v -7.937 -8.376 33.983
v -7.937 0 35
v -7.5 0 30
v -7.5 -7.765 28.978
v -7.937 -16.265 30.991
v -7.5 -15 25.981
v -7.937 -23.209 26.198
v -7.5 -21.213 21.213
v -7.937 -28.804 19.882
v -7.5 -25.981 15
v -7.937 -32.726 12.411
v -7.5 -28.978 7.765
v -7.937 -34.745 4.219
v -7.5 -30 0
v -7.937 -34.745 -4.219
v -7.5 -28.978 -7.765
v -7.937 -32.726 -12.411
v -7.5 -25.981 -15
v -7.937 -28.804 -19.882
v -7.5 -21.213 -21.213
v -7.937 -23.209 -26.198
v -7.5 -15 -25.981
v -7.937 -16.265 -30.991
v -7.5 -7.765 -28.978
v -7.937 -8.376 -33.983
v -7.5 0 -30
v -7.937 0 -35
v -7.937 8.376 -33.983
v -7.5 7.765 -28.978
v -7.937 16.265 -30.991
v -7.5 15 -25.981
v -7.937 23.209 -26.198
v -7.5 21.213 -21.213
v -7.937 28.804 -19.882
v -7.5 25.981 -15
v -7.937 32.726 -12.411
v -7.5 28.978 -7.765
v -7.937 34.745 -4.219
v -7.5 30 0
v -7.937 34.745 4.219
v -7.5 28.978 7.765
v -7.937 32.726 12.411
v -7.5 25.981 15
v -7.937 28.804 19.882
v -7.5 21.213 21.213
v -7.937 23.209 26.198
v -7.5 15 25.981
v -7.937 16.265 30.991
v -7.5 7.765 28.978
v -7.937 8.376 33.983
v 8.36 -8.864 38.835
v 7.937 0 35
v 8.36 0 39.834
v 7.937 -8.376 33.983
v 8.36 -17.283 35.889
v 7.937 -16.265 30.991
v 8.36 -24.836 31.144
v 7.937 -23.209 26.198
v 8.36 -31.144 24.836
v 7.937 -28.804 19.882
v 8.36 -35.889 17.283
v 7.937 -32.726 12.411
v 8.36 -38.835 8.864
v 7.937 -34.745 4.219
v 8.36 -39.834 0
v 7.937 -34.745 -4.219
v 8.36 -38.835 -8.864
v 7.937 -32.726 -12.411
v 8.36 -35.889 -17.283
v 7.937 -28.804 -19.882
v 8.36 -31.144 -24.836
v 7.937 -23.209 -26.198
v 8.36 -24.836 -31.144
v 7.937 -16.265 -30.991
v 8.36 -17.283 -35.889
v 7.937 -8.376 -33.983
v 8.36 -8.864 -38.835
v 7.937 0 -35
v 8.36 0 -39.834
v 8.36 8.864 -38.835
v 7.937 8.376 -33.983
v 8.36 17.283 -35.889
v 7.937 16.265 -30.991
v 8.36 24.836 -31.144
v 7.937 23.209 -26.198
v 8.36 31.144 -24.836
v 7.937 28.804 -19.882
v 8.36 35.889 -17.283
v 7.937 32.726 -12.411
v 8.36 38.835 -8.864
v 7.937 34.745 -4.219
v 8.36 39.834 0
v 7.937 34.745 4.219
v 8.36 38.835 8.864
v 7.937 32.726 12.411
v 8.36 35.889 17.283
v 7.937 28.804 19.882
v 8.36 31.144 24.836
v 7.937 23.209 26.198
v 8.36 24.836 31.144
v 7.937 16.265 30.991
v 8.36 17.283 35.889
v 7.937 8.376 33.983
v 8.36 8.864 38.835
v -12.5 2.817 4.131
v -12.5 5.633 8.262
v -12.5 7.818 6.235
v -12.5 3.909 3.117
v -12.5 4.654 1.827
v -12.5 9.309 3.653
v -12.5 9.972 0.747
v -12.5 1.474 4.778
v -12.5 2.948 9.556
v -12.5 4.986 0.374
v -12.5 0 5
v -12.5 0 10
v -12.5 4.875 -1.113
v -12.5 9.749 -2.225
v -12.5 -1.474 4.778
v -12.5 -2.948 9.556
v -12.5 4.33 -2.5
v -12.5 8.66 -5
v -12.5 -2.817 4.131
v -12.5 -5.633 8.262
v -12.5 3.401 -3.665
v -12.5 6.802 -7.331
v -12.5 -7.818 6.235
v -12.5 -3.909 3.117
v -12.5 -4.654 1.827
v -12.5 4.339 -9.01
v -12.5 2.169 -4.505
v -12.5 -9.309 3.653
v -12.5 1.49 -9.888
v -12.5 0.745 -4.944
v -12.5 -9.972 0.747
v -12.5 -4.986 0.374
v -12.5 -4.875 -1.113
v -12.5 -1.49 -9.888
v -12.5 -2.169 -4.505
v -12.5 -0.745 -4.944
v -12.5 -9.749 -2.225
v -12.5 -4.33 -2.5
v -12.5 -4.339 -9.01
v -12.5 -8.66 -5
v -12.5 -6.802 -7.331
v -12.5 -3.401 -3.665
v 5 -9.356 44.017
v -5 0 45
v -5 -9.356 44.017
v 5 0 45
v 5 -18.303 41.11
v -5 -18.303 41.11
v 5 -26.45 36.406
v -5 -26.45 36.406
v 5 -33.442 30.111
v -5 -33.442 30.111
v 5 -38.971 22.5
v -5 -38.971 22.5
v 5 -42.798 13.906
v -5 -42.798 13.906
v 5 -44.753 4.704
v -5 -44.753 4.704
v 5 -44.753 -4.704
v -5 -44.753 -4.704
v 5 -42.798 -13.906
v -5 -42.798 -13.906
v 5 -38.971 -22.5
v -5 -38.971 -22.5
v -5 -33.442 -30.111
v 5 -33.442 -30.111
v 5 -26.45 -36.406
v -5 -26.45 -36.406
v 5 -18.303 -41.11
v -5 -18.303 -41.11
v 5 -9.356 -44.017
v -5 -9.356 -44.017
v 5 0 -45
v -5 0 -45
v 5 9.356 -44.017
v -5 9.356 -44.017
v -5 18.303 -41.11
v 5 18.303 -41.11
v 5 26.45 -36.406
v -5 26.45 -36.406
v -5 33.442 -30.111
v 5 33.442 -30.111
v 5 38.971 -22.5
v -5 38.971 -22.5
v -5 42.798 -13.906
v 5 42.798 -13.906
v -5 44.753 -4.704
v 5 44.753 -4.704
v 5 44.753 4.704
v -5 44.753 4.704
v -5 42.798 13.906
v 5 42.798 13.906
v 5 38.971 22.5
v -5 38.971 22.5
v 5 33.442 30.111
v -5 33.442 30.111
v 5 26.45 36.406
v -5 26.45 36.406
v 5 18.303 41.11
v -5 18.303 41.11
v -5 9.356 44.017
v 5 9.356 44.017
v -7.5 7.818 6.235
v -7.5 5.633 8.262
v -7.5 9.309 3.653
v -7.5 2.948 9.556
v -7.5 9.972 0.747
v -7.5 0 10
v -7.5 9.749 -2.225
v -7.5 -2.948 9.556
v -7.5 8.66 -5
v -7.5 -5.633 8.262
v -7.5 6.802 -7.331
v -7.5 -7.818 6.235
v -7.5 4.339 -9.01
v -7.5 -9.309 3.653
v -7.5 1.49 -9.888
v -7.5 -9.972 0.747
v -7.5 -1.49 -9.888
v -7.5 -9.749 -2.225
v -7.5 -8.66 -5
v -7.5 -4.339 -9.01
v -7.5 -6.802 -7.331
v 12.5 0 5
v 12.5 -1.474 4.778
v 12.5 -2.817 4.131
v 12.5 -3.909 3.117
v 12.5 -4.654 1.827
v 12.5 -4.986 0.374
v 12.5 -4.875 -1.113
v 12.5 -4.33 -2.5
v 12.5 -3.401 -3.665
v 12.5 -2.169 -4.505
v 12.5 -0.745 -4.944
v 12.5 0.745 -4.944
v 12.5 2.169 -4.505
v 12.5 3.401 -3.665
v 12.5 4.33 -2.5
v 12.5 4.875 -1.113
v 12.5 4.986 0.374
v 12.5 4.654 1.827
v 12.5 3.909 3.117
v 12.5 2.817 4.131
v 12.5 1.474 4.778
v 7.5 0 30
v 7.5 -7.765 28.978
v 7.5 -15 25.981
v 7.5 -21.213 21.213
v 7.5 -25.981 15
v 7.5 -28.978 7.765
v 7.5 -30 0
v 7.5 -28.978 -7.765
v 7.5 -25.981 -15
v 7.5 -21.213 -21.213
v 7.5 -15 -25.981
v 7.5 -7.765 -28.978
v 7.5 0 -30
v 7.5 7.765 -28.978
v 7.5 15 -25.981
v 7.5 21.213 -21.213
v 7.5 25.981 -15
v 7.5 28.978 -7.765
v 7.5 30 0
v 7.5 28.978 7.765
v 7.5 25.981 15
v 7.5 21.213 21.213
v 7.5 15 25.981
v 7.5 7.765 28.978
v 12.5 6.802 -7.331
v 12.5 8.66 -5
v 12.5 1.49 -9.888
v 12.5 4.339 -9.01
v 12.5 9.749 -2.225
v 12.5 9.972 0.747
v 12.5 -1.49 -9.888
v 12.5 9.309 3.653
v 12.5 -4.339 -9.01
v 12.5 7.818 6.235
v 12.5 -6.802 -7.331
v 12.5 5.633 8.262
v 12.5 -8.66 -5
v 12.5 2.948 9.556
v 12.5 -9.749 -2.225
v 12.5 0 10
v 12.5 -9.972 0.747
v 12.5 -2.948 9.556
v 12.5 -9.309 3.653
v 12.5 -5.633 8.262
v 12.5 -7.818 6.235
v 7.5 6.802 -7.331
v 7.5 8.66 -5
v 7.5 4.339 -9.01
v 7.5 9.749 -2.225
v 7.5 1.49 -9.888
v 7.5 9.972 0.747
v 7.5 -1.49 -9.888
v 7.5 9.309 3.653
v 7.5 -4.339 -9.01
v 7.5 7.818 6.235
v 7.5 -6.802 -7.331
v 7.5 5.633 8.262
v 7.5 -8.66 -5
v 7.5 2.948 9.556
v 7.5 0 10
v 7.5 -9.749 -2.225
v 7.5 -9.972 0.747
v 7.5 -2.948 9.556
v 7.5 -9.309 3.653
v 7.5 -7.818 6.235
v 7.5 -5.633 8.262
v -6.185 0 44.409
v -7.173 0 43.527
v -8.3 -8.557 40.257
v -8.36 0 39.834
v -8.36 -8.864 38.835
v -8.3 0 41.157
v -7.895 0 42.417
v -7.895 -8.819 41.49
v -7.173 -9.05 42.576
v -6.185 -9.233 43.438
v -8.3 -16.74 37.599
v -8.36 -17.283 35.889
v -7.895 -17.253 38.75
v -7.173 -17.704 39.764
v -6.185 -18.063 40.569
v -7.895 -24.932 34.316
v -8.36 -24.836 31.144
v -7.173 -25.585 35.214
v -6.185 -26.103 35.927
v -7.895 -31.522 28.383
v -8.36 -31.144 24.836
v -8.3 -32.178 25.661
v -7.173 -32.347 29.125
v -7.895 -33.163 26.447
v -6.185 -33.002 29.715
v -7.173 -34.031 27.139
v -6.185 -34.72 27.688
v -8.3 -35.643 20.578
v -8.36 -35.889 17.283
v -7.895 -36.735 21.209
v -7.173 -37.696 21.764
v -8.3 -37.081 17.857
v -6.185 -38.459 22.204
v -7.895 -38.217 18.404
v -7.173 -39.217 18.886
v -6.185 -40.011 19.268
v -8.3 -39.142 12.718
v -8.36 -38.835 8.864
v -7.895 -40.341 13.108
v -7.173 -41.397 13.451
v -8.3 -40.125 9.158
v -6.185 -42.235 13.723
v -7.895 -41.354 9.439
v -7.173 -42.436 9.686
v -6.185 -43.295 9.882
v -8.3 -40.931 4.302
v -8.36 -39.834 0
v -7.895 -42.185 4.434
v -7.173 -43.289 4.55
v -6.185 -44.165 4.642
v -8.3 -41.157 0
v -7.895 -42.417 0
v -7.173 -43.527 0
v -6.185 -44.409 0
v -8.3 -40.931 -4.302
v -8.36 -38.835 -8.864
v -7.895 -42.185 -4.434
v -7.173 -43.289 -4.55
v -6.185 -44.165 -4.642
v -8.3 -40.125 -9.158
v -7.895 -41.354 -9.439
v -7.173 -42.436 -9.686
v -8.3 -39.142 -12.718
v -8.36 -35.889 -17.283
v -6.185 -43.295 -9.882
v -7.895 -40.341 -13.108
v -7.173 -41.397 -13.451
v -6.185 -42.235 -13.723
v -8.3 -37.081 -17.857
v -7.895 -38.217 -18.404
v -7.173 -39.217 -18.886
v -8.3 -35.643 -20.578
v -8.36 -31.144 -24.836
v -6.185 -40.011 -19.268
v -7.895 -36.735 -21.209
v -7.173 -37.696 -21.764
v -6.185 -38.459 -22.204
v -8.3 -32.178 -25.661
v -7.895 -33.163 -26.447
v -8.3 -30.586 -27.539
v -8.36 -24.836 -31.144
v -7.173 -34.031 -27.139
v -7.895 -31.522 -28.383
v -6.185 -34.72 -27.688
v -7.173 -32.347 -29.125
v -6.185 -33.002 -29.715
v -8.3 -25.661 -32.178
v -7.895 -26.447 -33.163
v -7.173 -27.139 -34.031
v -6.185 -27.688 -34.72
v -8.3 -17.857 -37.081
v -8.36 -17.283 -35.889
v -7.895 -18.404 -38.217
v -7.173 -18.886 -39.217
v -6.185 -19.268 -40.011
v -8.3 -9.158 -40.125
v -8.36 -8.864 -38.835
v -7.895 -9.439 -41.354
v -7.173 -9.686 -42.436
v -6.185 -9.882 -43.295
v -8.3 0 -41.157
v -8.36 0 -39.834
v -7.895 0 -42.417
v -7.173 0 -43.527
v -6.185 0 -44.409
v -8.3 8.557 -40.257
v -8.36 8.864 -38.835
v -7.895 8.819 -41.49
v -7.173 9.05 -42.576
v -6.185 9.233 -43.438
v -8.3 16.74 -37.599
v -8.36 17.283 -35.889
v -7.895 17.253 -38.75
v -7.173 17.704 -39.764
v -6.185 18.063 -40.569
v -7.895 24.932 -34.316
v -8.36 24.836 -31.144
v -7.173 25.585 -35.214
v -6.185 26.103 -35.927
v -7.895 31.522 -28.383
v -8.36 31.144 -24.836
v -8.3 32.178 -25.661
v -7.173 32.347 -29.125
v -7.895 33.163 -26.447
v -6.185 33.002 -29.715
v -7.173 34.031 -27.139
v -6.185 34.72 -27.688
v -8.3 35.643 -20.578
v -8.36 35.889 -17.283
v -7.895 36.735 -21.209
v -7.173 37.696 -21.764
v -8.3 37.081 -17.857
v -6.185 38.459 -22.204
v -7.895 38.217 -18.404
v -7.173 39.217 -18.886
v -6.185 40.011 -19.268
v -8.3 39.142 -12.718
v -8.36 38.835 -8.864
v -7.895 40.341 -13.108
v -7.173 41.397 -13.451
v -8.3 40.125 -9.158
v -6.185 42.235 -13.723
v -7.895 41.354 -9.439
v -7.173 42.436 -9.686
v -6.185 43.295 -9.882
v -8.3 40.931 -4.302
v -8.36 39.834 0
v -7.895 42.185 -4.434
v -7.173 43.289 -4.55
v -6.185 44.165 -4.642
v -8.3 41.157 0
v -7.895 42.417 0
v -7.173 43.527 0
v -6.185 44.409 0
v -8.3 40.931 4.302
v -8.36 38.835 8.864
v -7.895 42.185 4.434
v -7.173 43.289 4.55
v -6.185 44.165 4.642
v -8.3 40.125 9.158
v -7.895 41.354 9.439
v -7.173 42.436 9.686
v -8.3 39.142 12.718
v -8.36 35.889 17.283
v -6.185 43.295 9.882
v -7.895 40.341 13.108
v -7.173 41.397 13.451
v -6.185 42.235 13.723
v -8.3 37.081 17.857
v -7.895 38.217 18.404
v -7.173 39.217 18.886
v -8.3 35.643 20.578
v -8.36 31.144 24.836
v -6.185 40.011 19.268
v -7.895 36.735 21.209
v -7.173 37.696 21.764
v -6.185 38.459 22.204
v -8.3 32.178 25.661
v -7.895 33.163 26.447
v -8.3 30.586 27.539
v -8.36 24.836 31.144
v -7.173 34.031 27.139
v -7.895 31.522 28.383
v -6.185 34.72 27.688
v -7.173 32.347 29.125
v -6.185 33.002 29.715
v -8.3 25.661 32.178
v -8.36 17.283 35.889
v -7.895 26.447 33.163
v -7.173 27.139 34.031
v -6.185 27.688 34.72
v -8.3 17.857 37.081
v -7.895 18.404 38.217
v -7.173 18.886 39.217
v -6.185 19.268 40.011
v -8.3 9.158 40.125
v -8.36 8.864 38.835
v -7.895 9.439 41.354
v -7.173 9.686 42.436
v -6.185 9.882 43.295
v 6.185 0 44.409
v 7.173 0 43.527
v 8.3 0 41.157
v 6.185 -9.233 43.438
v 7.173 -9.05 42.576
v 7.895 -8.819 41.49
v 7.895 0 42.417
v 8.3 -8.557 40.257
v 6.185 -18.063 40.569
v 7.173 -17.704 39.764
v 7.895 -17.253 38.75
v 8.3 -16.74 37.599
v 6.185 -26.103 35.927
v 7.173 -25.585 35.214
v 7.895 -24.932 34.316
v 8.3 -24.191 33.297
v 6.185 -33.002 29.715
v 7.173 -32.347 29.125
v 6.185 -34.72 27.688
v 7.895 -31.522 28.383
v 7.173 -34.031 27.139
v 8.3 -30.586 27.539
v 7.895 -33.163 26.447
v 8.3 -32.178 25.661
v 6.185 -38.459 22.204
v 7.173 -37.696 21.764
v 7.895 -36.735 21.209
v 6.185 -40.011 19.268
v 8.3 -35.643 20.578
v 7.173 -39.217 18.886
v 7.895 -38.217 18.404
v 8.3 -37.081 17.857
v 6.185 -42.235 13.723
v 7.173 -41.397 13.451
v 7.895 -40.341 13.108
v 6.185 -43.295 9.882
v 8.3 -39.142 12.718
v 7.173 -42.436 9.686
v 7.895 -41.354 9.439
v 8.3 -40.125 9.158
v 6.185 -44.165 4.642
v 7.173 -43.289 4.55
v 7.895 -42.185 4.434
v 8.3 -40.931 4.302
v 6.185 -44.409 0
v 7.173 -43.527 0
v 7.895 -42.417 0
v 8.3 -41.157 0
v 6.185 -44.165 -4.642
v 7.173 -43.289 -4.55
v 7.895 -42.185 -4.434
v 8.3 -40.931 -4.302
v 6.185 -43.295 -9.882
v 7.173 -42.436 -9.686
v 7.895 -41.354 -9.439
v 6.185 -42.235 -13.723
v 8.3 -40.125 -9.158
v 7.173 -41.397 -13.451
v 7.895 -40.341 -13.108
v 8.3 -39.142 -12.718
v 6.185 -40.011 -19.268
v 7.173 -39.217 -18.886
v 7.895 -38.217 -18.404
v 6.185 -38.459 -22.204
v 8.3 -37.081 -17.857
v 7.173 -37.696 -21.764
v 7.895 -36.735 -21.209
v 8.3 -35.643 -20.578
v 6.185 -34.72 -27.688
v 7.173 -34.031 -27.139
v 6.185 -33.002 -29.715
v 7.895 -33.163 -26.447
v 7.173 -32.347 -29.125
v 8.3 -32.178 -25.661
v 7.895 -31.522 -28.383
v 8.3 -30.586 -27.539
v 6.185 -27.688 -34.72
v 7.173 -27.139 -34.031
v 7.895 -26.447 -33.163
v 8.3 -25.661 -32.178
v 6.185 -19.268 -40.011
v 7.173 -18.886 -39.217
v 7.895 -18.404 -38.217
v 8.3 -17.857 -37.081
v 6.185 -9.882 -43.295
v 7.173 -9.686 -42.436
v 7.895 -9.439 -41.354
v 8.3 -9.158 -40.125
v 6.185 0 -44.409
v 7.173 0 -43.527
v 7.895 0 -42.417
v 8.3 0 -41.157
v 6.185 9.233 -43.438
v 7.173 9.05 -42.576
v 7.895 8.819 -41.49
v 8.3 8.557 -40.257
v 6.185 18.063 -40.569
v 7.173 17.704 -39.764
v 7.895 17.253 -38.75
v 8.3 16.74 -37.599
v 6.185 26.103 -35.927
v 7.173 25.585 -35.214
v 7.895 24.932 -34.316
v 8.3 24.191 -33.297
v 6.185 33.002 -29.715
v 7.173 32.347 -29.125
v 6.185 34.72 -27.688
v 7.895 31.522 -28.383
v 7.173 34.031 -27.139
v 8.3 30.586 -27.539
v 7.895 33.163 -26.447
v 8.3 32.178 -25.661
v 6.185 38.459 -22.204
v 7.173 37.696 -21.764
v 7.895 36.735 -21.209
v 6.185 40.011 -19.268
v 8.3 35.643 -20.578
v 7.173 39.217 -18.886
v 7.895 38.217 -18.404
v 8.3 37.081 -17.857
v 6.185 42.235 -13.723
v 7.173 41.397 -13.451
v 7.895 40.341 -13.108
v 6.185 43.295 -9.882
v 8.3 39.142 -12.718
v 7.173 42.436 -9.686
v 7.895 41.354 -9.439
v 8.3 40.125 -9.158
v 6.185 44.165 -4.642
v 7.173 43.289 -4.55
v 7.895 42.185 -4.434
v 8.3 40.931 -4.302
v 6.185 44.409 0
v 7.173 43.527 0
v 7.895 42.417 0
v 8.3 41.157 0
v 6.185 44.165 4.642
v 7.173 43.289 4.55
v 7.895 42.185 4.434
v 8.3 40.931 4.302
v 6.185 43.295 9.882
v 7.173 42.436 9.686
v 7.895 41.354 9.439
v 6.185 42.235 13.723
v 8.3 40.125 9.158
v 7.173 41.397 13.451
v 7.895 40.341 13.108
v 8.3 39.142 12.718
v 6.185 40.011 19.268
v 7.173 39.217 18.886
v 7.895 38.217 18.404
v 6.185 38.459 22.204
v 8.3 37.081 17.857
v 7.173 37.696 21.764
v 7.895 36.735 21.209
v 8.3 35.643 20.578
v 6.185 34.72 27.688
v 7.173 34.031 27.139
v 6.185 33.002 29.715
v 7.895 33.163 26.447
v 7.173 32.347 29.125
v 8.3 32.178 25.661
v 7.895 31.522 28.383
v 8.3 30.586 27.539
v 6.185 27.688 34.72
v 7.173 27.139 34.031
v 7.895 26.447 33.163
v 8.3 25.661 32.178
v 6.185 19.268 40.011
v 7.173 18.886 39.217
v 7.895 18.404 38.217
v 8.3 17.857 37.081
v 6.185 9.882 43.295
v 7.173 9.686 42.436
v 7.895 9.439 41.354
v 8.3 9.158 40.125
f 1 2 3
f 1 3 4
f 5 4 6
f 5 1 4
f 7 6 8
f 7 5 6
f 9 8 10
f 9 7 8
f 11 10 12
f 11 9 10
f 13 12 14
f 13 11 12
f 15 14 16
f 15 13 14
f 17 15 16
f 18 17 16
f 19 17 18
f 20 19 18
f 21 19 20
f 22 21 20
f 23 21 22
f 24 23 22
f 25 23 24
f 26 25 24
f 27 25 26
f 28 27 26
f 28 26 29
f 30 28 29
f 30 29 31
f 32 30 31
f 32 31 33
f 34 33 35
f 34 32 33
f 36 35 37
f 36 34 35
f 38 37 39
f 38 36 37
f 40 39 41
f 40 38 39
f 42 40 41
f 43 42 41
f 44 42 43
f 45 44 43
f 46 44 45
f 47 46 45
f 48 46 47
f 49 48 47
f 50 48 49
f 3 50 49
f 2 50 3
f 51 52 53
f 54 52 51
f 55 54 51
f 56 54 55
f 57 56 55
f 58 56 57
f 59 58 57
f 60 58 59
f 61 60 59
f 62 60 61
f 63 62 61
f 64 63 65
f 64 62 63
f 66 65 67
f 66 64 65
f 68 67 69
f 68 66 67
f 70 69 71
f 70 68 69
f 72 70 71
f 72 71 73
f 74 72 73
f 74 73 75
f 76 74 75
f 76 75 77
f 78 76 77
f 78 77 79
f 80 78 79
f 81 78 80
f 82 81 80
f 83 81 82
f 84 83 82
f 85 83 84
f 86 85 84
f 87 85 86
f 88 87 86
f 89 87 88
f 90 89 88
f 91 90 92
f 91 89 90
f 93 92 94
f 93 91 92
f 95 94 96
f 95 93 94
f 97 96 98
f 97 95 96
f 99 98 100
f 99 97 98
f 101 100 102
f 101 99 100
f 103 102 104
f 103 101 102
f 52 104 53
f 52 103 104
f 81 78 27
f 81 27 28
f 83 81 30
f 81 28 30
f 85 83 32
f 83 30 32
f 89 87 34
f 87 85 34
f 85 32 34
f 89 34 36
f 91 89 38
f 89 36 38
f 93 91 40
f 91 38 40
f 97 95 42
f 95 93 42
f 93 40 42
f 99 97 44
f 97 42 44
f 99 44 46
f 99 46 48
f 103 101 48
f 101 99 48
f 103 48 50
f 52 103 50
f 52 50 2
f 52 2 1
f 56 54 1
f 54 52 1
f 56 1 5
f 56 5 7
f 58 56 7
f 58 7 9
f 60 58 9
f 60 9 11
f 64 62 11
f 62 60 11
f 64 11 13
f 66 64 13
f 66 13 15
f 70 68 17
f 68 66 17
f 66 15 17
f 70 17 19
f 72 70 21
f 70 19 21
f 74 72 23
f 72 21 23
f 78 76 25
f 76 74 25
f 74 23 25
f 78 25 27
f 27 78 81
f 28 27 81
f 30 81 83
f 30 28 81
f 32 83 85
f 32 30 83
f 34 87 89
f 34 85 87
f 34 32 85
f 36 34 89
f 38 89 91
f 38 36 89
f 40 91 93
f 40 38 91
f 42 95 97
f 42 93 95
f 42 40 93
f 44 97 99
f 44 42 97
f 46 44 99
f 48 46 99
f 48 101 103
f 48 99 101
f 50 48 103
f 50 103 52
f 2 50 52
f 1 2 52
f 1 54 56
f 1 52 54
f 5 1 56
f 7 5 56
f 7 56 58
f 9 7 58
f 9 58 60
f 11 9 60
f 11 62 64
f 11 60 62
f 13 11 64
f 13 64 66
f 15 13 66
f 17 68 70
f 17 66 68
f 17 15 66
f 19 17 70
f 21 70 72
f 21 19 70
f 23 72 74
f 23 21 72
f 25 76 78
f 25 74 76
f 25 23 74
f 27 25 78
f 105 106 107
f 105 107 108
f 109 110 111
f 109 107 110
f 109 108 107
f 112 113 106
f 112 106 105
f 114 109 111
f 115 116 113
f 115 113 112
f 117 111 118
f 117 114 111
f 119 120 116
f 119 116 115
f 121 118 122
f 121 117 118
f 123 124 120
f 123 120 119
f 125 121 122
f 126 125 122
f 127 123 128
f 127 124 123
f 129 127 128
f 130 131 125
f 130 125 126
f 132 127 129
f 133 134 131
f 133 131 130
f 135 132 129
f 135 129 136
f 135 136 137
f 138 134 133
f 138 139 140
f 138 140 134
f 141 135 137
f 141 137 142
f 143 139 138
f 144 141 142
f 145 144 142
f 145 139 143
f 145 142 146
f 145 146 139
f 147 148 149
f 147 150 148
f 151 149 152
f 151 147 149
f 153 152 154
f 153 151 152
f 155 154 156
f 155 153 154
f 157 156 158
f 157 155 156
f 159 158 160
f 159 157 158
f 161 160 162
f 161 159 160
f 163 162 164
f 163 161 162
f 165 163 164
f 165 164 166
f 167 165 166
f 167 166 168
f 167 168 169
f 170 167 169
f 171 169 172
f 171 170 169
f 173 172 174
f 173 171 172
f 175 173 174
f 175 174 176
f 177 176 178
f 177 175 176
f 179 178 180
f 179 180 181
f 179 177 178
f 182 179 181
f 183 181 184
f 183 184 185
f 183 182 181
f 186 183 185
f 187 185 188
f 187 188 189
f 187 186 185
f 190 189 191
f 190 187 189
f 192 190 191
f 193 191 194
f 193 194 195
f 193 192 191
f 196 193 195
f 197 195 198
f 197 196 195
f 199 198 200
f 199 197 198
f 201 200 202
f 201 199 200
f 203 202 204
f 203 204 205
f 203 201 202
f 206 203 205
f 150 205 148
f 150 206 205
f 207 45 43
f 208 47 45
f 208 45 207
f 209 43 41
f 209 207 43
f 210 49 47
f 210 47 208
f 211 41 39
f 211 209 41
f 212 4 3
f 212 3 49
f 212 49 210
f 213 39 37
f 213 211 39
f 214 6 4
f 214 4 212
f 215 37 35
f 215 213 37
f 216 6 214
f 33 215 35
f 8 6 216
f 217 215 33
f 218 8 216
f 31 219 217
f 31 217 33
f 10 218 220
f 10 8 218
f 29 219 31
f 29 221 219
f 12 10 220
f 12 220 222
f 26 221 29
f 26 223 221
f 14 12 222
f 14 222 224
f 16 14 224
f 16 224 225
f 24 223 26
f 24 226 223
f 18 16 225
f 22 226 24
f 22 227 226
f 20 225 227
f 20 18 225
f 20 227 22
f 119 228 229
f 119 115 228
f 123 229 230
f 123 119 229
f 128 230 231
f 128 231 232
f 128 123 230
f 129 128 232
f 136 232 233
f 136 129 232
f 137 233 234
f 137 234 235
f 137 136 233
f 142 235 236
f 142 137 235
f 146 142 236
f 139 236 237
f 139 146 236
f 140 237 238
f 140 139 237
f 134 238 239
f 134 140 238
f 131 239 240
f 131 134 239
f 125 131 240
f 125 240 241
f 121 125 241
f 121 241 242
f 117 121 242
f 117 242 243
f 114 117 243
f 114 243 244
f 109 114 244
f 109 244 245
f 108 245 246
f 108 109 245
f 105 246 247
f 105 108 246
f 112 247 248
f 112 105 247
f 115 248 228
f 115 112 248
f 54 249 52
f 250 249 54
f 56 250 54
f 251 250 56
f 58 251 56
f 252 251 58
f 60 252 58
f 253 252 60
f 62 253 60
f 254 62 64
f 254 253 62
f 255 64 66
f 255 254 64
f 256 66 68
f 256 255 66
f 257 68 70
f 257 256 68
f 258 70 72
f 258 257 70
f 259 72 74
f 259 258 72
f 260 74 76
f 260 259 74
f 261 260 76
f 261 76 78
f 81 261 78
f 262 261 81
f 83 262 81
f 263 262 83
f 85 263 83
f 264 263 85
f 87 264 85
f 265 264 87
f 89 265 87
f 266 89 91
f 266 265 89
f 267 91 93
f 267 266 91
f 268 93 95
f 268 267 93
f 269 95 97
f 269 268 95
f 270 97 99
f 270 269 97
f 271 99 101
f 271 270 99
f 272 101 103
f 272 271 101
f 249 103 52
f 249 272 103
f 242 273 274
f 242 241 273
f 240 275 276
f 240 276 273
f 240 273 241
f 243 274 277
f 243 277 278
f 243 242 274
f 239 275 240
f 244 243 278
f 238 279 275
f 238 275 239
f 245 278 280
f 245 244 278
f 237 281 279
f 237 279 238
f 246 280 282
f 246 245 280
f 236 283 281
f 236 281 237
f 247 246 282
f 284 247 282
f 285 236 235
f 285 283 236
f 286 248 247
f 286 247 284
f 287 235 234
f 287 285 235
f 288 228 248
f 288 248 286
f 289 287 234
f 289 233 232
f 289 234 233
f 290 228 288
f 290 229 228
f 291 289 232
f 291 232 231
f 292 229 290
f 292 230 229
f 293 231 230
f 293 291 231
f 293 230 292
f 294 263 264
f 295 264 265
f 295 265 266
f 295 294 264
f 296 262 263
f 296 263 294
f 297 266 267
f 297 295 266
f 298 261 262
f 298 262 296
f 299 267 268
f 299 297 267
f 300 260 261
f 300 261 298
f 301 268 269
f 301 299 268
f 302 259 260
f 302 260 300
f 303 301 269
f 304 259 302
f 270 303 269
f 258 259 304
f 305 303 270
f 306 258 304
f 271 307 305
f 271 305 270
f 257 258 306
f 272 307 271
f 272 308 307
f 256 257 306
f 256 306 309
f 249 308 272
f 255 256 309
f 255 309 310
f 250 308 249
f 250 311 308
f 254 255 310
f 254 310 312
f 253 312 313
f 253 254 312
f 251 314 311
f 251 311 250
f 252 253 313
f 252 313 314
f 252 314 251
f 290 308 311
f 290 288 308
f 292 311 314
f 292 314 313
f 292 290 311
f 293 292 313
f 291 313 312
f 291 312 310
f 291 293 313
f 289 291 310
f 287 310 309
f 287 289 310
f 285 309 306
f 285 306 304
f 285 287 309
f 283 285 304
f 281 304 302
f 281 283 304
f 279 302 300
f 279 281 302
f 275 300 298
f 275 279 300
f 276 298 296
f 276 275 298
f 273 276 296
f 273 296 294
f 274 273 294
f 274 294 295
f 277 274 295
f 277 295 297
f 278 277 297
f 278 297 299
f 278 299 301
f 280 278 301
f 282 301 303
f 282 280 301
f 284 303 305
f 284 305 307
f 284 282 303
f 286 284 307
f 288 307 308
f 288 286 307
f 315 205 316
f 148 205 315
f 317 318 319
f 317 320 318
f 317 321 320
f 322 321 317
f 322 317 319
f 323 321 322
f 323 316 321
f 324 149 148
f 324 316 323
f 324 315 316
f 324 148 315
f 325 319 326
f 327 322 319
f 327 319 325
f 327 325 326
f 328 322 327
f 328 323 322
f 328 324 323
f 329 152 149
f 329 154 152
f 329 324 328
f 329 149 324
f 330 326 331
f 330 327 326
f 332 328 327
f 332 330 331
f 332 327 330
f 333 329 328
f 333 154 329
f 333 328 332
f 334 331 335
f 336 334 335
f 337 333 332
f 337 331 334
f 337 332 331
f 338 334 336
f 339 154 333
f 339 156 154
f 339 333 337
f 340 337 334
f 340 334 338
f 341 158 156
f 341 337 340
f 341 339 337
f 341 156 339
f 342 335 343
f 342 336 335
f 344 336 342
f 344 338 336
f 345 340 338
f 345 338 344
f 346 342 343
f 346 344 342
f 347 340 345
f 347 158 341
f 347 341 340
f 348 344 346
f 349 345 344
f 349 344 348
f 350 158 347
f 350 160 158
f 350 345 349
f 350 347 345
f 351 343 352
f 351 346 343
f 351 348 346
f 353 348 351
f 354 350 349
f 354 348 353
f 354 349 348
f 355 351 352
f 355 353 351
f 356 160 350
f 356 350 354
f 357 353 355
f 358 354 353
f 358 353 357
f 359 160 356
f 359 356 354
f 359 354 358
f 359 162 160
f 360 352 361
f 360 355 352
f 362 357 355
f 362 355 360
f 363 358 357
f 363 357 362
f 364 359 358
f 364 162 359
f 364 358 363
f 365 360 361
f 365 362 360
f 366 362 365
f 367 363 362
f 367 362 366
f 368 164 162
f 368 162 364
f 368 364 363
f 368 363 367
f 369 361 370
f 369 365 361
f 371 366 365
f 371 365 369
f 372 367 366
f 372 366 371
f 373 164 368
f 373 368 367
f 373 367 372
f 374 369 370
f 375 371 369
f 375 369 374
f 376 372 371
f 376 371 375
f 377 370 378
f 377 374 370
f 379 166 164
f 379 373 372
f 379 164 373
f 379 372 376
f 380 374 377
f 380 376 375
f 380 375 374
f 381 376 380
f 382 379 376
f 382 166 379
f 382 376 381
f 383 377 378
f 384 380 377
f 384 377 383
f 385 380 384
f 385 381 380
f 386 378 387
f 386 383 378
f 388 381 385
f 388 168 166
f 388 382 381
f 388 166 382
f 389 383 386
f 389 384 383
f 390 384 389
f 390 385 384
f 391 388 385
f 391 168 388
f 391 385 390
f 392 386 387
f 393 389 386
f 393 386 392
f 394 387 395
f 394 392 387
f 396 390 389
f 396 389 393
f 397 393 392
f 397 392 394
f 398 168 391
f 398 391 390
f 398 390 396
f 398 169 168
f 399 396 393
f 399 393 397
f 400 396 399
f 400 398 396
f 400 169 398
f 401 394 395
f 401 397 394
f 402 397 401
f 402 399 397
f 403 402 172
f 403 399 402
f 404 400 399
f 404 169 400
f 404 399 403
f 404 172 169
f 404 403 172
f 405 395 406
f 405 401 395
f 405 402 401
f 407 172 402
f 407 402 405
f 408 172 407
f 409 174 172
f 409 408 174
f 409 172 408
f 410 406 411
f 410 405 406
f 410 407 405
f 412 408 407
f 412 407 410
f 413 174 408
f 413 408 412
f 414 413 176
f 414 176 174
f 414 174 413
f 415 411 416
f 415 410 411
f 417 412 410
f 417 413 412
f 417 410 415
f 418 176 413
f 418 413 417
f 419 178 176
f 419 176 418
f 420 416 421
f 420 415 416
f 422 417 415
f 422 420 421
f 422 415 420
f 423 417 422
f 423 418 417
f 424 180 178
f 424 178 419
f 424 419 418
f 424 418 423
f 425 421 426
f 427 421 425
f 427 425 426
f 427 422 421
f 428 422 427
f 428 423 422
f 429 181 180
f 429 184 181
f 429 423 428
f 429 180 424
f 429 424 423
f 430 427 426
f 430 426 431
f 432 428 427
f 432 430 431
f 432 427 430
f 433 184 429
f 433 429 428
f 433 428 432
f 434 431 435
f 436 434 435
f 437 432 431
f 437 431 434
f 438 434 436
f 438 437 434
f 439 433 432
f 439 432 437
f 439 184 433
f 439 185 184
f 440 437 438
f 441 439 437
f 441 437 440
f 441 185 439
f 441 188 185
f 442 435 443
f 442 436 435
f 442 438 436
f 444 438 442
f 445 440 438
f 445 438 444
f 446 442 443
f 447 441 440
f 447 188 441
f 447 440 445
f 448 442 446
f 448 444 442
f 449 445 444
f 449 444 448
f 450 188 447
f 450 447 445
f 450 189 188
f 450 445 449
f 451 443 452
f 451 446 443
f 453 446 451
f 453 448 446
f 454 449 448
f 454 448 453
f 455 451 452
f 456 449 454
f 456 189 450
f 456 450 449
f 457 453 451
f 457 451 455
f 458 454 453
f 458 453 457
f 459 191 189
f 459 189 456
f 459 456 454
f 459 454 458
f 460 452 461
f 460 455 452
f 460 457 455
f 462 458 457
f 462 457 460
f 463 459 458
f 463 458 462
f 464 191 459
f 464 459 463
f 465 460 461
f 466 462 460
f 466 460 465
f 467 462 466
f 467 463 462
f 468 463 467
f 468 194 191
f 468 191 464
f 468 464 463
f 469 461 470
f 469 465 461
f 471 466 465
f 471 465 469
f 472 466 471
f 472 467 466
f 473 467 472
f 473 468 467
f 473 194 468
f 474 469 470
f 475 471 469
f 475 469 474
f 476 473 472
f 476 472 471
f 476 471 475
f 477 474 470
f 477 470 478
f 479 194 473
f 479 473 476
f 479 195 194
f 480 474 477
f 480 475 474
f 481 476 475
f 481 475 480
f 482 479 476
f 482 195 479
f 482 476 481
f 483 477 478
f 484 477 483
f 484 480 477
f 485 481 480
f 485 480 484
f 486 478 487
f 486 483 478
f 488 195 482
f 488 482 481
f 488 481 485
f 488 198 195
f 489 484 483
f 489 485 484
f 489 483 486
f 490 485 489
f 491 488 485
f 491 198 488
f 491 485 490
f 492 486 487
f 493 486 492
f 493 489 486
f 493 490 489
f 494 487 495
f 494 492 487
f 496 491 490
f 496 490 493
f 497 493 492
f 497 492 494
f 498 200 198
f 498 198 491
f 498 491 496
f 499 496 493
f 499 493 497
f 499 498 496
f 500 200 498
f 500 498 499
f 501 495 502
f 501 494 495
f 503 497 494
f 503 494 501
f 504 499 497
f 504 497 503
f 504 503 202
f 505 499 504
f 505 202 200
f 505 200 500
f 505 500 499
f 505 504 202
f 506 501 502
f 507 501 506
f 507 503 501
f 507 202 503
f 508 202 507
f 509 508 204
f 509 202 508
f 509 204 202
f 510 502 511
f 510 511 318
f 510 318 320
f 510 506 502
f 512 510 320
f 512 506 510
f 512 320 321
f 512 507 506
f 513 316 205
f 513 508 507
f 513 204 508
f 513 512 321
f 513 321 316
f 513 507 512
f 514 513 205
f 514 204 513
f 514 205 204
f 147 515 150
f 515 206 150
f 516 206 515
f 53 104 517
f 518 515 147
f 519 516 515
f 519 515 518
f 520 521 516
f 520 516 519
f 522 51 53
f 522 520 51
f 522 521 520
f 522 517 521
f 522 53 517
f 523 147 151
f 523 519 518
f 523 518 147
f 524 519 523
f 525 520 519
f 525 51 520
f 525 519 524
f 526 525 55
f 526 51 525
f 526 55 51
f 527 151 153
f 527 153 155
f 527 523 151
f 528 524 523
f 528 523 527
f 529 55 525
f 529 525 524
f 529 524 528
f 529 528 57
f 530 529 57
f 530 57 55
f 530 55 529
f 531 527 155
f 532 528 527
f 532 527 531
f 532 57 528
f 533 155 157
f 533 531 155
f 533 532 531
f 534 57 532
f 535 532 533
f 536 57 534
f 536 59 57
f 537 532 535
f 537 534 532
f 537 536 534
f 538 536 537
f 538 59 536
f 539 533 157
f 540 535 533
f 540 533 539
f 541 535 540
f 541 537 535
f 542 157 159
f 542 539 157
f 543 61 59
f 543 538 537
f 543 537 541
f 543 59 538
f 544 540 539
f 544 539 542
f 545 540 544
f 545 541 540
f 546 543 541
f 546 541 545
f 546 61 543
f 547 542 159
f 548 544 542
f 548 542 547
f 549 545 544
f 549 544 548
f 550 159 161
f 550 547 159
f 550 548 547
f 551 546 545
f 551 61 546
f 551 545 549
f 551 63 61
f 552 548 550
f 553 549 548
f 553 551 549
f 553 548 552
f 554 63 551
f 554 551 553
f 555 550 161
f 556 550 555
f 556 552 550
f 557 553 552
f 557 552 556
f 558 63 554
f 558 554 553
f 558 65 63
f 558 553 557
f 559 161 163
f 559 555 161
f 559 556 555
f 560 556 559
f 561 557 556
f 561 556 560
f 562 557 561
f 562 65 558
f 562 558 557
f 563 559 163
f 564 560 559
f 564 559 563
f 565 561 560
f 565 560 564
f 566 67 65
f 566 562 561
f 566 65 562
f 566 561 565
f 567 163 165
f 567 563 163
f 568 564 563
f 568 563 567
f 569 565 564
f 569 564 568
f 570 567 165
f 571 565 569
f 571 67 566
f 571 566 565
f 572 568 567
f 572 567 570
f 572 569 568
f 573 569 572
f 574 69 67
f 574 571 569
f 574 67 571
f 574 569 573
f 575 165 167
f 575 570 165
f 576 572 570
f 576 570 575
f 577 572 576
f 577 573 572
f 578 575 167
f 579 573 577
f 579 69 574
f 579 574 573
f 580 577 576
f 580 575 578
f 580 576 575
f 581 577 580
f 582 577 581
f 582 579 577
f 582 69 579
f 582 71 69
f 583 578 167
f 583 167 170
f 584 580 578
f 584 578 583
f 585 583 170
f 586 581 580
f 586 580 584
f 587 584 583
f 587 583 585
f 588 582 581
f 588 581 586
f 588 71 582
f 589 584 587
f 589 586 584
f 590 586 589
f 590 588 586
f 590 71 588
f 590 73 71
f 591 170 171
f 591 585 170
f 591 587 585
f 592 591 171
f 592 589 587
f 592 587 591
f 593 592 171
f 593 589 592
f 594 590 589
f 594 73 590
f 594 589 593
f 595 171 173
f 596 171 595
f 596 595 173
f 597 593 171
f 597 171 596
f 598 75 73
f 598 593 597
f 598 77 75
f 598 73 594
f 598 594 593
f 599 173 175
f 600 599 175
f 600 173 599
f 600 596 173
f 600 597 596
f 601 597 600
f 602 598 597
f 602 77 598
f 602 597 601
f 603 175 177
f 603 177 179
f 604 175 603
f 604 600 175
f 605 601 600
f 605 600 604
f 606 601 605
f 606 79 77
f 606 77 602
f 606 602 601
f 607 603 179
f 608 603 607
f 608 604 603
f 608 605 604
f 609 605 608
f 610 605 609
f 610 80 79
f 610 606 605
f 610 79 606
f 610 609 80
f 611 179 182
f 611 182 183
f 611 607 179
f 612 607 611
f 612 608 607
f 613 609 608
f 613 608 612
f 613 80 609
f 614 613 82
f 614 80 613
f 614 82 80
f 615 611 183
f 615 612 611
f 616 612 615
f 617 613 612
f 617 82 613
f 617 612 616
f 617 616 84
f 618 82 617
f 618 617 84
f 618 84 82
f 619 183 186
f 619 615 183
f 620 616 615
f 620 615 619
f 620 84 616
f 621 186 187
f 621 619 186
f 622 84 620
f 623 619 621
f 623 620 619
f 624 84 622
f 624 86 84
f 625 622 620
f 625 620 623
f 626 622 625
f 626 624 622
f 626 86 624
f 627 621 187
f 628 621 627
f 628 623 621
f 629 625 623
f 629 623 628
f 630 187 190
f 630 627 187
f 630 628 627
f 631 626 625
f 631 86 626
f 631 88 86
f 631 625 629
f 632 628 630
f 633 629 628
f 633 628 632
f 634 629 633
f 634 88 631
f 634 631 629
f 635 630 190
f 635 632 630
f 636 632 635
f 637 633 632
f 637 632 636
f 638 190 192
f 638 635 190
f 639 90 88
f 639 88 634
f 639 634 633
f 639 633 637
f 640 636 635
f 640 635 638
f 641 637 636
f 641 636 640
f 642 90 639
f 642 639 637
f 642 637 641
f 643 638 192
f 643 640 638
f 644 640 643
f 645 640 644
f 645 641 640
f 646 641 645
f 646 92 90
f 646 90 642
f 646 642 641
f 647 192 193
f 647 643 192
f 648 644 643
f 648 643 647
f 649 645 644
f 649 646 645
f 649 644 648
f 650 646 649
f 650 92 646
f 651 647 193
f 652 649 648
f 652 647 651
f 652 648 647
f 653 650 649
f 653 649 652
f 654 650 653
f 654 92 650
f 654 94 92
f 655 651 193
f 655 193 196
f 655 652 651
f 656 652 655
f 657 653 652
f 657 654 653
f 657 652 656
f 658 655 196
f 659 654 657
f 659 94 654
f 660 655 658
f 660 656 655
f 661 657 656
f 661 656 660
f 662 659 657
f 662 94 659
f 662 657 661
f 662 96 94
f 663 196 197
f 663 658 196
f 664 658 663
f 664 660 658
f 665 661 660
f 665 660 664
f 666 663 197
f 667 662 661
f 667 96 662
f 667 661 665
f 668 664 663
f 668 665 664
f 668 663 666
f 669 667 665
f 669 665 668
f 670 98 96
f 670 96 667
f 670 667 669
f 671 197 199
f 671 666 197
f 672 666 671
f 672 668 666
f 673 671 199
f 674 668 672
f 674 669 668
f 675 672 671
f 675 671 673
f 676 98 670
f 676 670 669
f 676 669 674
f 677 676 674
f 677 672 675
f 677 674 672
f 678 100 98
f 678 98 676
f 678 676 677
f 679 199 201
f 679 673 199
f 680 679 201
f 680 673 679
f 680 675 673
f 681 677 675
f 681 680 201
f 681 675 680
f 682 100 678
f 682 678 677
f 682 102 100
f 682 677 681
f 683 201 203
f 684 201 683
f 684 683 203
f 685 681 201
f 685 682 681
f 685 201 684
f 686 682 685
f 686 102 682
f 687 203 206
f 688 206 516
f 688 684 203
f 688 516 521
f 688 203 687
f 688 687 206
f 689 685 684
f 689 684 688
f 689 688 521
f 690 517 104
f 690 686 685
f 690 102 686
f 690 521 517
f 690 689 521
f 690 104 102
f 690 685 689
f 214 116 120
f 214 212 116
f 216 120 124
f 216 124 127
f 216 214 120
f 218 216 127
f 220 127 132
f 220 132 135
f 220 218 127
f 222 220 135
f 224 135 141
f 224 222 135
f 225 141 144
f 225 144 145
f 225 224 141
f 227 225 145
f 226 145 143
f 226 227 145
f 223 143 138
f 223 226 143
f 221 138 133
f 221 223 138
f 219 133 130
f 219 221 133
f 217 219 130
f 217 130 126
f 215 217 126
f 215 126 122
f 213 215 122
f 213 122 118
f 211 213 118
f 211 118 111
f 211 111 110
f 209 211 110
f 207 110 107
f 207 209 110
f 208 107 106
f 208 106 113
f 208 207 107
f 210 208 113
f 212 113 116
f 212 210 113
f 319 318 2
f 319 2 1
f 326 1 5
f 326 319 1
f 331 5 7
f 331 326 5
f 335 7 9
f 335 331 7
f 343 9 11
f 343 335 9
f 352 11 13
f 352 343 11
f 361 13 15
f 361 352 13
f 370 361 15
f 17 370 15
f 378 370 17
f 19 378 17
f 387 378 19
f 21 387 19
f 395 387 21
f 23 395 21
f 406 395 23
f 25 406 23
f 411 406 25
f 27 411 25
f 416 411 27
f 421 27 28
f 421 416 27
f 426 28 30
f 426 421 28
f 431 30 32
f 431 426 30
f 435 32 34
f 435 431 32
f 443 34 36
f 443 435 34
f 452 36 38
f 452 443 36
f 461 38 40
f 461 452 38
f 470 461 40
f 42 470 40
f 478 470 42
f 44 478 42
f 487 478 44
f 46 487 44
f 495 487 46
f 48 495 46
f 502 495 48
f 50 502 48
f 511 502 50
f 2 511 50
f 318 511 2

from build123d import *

# Parameters (mm, degrees)
OBERFL_CHE_LINEAR_AUSTRAGEN1_1_BACK  = 9
OBERFL_CHE_LINEAR_AUSTRAGEN1_1_DEPTH = 18
OBERFL_CHE_LINEAR_AUSTRAGEN1_2_BACK  = 9
OBERFL_CHE_LINEAR_AUSTRAGEN1_2_DEPTH = 18


with BuildPart() as part:
    # Skizze1 → Rotation1 (revolve)
    with BuildSketch(Plane.XY, mode=Mode.PRIVATE) as rotation1_sk:
        with BuildLine():
            Line((-12.5, 5), (-12.5, 10))
            Line((-12.5, 10), (-7.5, 10))
            Line((-7.5, 10), (-7.5, 30))
            Line((-7.5, 30), (-8.360375819, 39.834140612))
            ThreePointArc((-8.360375819, 39.834140612), (-7.570668397, 42.996325154), (-5, 45))
            Line((-5, 45), (5, 45))
            ThreePointArc((5, 45), (7.570668397, 42.996325154), (8.360375819, 39.834140612))
            Line((8.360375819, 39.834140612), (7.5, 30))
            Line((7.5, 30), (7.5, 10))
            Line((7.5, 10), (12.5, 10))
            Line((12.5, 10), (12.5, 5))
            Line((12.5, 5), (-12.5, 5))
        make_face()
    revolve(rotation1_sk.sketch.rotate(Axis((0, 0, 0), (1, 0, 0)), 90), axis=Axis((0, 0, 0), (1, 0, 0)))  # turned: the seam where the file's is


with BuildPart() as body_2:
    # Abspalten1: the piece behind the surface
    add(part.part)
    # Oberfläche-Linear austragen1: a surface, the sketch's curves swept straight by 18 mm
    with BuildLine(Plane(origin=(0, 0, 0), x_dir=(0, 0, -1), z_dir=(1, 0, 0)).offset(-OBERFL_CHE_LINEAR_AUSTRAGEN1_1_BACK), mode=Mode.PRIVATE) as oberfl_che_linear_austragen1_1_path:
        CenterArc((0, 0), 35, 0, 360)
    oberfl_che_linear_austragen1_1 = Shell.extrude(oberfl_che_linear_austragen1_1_path.wire(), (1 * OBERFL_CHE_LINEAR_AUSTRAGEN1_1_DEPTH, 0 * OBERFL_CHE_LINEAR_AUSTRAGEN1_1_DEPTH, 0 * OBERFL_CHE_LINEAR_AUSTRAGEN1_1_DEPTH))
    split(bisect_by=oberfl_che_linear_austragen1_1, keep=Keep.BOTTOM)


with BuildPart() as part_1:
    add(part.part)

    # Abspalten1: split by a surface, the side it looks to stays
    # Oberfläche-Linear austragen1: a surface, the sketch's curves swept straight by 18 mm
    with BuildLine(Plane(origin=(0, 0, 0), x_dir=(0, 0, -1), z_dir=(1, 0, 0)).offset(-OBERFL_CHE_LINEAR_AUSTRAGEN1_2_BACK), mode=Mode.PRIVATE) as oberfl_che_linear_austragen1_2_path:
        CenterArc((0, 0), 35, 0, 360)
    oberfl_che_linear_austragen1_2 = Shell.extrude(oberfl_che_linear_austragen1_2_path.wire(), (1 * OBERFL_CHE_LINEAR_AUSTRAGEN1_2_DEPTH, 0 * OBERFL_CHE_LINEAR_AUSTRAGEN1_2_DEPTH, 0 * OBERFL_CHE_LINEAR_AUSTRAGEN1_2_DEPTH))
    split(bisect_by=oberfl_che_linear_austragen1_2, keep=Keep.TOP)


solid = Compound([body_2.part, part_1.part])
